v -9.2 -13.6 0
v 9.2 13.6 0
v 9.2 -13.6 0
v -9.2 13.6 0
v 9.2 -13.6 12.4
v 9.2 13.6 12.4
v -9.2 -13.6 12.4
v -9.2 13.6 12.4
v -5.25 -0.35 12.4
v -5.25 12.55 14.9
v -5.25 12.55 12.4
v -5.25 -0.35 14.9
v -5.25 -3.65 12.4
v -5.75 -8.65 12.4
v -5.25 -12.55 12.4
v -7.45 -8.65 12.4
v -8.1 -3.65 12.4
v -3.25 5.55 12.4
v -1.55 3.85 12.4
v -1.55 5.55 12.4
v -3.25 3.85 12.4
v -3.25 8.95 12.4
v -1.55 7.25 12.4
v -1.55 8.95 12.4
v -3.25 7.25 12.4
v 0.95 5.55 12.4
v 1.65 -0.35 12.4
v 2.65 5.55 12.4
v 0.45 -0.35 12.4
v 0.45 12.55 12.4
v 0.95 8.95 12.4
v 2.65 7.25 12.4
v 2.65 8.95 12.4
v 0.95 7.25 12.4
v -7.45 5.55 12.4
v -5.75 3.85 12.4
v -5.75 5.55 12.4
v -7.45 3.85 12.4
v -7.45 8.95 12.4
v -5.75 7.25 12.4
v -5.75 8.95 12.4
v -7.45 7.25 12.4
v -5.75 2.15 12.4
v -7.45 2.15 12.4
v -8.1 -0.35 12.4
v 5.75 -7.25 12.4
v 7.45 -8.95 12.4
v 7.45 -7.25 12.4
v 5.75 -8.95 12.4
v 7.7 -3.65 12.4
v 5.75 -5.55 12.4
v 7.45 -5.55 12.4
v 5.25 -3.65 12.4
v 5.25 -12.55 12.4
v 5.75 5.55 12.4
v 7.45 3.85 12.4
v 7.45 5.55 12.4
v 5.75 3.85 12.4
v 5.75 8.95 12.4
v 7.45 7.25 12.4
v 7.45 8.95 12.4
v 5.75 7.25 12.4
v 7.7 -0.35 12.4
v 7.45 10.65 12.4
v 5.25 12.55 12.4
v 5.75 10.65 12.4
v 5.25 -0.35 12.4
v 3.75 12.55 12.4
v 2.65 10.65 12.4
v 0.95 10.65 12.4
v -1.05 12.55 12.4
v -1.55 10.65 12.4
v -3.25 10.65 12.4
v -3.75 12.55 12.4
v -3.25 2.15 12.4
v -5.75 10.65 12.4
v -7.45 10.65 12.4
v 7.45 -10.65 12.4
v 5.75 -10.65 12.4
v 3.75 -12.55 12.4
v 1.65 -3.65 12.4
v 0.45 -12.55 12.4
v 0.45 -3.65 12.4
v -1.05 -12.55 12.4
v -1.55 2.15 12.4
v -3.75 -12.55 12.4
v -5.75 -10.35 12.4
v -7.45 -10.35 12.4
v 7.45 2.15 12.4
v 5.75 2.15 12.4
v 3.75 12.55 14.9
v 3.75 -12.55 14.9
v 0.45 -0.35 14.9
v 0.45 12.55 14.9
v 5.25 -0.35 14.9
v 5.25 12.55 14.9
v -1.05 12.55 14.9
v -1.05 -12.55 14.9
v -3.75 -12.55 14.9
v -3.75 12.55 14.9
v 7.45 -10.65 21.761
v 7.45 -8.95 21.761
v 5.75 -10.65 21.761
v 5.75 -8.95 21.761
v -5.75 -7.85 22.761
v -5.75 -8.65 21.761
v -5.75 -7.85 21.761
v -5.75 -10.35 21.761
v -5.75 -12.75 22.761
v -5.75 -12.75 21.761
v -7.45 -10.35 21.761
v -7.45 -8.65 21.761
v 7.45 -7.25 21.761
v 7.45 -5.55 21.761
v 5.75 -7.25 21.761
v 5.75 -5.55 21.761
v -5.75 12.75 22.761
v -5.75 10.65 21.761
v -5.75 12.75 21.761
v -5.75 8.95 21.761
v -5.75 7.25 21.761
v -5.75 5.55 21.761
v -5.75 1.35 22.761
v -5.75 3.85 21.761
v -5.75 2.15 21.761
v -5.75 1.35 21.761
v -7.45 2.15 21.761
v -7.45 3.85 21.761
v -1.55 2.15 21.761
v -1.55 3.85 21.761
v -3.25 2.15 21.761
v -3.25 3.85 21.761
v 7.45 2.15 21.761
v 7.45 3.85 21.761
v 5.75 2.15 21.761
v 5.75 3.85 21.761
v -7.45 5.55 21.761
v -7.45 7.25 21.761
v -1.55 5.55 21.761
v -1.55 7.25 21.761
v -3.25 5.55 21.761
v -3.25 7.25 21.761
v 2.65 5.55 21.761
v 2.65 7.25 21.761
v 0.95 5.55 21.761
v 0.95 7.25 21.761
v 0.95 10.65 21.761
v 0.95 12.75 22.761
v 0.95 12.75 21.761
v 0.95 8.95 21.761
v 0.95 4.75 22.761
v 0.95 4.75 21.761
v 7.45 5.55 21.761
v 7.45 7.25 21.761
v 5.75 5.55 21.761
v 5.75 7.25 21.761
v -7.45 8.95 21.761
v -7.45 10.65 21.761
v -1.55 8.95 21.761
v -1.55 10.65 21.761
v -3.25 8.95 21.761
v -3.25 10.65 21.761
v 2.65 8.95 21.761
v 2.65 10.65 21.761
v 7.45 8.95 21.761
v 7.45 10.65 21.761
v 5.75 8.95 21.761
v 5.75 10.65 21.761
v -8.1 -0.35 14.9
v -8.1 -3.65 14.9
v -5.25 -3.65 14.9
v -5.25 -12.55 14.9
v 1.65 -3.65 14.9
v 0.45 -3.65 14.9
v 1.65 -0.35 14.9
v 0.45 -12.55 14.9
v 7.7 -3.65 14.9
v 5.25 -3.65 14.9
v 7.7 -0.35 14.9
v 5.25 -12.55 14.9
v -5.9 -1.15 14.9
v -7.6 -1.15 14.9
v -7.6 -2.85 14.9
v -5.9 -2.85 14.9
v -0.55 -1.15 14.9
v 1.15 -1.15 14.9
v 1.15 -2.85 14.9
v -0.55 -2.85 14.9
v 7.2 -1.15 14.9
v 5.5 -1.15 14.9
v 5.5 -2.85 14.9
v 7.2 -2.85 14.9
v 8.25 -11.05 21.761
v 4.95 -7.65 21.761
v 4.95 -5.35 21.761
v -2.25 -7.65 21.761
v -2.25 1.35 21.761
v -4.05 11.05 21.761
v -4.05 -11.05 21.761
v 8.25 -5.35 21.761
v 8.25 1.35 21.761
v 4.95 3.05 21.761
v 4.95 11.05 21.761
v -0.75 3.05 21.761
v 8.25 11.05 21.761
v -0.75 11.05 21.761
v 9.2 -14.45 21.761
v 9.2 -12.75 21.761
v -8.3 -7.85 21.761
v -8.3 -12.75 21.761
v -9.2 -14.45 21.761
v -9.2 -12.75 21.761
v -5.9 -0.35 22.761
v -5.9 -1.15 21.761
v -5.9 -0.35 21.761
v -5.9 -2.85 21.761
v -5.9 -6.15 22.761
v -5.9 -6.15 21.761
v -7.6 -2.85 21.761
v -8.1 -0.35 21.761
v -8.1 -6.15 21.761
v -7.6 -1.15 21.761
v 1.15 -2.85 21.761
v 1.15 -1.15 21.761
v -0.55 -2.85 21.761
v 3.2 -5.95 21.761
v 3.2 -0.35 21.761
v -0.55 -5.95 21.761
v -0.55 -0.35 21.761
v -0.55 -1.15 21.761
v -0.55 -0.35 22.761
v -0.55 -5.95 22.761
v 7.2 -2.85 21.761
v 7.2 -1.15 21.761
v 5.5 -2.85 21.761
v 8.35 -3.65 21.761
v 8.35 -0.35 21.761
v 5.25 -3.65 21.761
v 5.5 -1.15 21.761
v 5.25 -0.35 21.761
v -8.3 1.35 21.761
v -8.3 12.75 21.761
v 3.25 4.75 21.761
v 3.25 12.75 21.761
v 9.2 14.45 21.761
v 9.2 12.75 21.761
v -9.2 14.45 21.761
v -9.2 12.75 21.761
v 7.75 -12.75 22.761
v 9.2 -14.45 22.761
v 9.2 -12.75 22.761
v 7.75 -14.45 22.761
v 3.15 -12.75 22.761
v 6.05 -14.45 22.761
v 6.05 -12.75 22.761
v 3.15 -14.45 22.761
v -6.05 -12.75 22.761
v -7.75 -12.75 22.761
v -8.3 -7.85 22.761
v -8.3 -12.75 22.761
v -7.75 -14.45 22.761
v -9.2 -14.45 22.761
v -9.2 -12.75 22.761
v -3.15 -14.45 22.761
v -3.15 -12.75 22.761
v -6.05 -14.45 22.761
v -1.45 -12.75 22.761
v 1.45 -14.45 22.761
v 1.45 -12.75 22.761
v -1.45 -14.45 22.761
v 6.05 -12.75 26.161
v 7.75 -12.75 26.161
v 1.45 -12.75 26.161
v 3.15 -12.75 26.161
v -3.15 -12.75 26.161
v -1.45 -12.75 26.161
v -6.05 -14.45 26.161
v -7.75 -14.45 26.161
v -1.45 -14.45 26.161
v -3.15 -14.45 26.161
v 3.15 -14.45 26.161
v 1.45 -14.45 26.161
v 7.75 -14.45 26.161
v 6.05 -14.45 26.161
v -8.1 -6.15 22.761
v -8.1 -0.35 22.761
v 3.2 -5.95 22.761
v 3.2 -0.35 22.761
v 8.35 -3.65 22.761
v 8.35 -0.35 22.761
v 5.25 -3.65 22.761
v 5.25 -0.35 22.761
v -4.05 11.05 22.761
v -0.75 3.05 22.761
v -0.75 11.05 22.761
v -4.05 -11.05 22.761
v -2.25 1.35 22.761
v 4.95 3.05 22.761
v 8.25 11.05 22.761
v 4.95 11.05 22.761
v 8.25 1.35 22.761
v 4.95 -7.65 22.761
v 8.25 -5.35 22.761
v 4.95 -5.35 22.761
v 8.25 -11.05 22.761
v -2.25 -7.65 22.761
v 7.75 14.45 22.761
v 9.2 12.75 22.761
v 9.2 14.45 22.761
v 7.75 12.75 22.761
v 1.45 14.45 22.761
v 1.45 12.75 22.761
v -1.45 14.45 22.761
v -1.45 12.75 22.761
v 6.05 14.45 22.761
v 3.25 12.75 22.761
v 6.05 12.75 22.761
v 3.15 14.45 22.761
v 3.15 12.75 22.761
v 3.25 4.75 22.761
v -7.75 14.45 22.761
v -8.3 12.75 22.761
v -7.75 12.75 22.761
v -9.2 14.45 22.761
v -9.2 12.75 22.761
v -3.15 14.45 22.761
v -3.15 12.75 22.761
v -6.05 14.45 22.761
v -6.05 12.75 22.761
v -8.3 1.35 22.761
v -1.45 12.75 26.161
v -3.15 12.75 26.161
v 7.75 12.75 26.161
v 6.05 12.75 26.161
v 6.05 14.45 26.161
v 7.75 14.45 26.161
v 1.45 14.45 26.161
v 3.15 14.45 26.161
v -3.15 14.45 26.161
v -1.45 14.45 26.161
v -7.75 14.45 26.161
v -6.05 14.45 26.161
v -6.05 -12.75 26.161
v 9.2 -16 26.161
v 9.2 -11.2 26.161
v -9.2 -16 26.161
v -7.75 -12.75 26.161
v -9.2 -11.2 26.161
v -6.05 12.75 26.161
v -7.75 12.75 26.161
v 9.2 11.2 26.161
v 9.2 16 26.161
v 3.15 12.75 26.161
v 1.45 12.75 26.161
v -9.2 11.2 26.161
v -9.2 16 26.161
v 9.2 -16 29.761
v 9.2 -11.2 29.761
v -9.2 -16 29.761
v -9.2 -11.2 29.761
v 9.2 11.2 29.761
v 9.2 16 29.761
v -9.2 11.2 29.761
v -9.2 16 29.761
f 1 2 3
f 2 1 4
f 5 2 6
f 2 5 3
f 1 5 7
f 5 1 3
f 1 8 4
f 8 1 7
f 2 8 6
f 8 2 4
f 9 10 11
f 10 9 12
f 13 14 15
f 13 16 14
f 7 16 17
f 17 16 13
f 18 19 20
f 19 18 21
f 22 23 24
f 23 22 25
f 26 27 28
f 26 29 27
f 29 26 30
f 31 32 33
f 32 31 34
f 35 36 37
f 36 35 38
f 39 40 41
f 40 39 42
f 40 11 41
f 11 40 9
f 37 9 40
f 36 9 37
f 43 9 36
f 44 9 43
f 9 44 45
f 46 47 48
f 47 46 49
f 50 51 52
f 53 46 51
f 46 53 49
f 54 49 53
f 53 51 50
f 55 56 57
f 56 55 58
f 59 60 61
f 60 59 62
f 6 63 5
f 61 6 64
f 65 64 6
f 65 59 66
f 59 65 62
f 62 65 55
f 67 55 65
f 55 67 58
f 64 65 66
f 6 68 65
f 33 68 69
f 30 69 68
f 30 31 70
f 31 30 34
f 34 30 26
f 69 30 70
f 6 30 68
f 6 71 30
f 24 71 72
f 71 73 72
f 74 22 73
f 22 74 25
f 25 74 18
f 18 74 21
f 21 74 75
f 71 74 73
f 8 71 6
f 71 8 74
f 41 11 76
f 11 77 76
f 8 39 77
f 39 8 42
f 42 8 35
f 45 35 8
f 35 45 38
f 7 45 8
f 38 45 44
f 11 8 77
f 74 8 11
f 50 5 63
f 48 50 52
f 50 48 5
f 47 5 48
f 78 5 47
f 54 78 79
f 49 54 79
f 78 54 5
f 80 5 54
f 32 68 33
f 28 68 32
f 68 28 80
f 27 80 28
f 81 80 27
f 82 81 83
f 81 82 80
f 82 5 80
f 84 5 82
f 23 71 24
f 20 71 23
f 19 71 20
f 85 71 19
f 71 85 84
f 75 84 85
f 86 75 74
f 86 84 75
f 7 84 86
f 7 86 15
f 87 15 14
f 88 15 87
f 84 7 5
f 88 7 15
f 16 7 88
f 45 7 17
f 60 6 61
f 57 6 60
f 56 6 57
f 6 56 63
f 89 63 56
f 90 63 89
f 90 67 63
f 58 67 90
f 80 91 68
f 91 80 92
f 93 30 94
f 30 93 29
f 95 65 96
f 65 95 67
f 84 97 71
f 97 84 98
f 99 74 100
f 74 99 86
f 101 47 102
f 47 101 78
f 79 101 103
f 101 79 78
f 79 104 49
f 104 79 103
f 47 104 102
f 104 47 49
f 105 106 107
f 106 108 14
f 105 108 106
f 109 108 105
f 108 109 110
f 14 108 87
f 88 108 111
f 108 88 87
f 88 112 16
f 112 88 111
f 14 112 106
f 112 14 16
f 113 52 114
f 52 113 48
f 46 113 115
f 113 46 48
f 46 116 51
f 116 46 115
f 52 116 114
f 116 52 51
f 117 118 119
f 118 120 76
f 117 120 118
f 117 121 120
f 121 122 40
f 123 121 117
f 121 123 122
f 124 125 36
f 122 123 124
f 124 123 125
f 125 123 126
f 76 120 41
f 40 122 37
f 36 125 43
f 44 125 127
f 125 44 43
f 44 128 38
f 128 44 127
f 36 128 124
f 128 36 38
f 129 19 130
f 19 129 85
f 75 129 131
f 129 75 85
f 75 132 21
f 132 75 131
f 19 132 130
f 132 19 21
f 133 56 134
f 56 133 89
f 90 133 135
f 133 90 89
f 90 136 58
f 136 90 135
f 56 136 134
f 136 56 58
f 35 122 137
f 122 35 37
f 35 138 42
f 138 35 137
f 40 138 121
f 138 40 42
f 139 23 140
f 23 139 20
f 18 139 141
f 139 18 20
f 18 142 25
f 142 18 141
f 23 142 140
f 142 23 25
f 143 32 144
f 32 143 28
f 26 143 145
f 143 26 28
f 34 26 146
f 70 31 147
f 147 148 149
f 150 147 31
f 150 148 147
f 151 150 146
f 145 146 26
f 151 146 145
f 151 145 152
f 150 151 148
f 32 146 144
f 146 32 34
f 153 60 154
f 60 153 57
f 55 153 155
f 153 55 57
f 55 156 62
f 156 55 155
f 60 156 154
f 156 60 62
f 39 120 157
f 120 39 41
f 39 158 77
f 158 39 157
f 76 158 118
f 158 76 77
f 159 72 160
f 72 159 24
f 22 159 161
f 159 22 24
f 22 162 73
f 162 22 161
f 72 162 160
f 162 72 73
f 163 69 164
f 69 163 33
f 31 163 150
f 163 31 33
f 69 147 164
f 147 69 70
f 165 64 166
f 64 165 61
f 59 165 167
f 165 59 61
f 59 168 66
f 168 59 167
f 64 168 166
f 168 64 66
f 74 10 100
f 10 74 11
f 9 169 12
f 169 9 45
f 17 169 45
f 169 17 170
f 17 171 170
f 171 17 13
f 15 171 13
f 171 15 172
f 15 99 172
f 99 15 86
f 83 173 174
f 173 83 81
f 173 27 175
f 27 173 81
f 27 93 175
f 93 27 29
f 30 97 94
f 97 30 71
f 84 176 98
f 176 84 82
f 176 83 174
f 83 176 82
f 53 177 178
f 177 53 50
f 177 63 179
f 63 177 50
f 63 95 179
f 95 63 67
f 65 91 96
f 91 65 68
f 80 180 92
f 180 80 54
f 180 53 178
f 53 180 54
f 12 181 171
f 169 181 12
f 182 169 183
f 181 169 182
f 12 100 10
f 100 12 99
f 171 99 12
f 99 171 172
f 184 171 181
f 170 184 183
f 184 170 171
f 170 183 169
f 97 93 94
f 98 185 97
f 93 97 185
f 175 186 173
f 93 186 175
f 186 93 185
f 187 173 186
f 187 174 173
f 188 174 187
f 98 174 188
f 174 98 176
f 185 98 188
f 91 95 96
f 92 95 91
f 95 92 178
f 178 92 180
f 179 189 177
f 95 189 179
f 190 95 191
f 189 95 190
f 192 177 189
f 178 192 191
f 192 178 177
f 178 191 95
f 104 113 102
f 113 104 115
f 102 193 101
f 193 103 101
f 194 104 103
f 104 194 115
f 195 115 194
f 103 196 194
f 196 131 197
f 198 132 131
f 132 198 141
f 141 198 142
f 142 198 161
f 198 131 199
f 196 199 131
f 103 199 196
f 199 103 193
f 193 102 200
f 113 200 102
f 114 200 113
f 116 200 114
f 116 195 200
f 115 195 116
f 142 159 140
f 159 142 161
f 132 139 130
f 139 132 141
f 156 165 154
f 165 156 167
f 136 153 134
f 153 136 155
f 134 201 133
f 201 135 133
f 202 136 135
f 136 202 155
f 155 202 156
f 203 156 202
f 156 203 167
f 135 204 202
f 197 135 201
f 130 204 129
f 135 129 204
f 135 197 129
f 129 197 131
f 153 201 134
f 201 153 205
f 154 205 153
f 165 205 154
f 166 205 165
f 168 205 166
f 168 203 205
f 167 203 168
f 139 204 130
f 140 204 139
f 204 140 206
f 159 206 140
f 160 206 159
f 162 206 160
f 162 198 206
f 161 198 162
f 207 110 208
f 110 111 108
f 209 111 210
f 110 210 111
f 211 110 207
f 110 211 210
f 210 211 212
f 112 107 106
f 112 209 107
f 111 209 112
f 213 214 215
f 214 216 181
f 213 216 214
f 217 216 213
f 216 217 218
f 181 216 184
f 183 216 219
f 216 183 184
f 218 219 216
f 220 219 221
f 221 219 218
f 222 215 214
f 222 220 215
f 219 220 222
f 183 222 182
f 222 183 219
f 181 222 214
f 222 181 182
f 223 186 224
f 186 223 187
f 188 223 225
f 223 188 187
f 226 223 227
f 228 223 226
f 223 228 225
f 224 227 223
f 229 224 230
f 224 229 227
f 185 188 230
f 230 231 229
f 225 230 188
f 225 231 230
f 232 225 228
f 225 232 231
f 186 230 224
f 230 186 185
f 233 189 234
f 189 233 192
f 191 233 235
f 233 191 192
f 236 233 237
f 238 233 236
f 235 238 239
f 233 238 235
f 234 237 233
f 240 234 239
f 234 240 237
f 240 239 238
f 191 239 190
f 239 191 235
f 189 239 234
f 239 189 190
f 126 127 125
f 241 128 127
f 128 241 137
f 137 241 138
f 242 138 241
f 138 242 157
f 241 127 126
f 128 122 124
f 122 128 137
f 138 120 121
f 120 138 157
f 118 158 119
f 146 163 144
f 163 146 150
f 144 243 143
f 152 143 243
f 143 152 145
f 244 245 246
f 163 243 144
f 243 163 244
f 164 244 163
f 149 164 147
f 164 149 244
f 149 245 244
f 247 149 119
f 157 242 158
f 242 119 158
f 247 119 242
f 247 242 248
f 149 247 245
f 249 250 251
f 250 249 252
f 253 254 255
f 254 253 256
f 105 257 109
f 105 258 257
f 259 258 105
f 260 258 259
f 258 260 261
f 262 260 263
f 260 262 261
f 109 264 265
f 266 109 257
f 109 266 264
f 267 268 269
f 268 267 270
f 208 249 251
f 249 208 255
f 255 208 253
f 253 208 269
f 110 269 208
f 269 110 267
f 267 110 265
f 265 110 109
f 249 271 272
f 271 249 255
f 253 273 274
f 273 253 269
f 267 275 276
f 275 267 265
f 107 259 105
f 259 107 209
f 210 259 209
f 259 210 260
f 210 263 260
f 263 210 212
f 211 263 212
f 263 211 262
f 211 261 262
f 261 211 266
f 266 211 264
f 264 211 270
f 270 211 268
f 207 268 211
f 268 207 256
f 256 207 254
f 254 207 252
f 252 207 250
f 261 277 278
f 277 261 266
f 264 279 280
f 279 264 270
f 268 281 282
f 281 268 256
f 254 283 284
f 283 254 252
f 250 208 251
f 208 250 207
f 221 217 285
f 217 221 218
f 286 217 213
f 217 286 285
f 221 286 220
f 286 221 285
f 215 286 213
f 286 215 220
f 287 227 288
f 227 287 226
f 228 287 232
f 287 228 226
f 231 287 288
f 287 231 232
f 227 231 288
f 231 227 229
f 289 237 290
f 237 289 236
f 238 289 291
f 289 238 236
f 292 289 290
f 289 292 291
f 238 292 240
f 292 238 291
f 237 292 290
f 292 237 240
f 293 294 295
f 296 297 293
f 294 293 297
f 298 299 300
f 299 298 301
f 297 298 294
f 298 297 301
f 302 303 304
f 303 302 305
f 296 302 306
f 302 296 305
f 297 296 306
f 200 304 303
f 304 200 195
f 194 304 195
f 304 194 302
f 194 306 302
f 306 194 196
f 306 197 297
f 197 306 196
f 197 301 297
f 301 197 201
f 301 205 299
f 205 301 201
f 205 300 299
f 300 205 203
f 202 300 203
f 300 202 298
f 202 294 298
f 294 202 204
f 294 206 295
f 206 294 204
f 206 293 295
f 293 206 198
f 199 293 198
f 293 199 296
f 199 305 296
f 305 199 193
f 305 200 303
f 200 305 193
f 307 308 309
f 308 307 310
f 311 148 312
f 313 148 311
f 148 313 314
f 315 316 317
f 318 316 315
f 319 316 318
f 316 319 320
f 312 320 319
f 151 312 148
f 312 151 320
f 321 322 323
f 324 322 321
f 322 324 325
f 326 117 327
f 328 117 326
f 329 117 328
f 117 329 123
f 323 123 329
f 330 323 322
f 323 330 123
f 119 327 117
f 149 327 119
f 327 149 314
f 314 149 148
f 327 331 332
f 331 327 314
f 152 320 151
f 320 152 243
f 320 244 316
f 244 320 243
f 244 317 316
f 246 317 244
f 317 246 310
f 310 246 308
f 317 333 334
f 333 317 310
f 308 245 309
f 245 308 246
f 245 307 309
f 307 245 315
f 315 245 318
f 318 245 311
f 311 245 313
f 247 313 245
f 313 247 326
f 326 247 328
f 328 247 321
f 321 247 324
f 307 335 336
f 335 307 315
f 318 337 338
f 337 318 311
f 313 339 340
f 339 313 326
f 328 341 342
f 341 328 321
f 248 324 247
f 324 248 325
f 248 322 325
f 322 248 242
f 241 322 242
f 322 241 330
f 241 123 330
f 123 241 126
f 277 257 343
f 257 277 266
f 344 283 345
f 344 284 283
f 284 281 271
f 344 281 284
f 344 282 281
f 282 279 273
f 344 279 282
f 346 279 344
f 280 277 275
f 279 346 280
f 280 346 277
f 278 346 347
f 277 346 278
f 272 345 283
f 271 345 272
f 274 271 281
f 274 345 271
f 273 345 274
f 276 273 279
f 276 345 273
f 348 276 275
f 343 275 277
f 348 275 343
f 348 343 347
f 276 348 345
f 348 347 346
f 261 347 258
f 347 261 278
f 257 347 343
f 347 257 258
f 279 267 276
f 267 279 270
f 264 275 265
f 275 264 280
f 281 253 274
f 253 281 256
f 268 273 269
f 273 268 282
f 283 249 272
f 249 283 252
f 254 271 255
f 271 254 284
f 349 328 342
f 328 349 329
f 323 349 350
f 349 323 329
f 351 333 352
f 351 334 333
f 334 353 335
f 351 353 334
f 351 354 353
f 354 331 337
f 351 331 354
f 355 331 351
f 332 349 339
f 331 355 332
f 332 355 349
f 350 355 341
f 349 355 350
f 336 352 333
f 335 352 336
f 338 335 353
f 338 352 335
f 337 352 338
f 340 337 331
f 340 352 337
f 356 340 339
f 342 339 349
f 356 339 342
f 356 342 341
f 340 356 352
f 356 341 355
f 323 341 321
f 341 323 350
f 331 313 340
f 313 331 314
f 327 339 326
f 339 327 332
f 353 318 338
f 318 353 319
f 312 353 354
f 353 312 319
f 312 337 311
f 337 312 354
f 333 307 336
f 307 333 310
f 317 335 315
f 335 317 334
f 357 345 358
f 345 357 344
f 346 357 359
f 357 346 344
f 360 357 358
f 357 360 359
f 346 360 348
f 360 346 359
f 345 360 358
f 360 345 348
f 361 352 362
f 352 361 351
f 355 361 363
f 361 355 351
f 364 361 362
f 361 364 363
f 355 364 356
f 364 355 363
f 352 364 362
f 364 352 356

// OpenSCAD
// Generated by SolidPython 0.4.2 on 2020-09-29 23:21:24
//!OpenSCAD

scale(v = 0.0100000000) {
	translate(v = [-920, -1360, 0]) {
		union() {
			color(c = [0.4000000000, 0.4000000000, 0.4000000000]) {
				translate(v = [0, 0, 0]) {
					linear_extrude(height = 1000.0000000000) {
						polygon(paths = [[0, 1, 2, 3]], points = [[0, 0], [0, 2720], [1840, 2720], [1840, 0]]);
					}
				}
			}
			color(c = [0.2000000000, 0.6000000000, 0.2000000000]) {
				translate(v = [0, 0, 1000.0000000000]) {
					linear_extrude(height = 120.0000000000) {
						polygon(paths = [[0, 1, 2, 3]], points = [[0, 1305], [0, 2720], [1840, 2720], [1840, 1305]]);
					}
				}
			}
			color(c = [0.4000000000, 0.4000000000, 0.4000000000]) {
				translate(v = [0, 0, 1000.0000000000]) {
					linear_extrude(height = 120.0000000000) {
						polygon(paths = [[0, 1, 2, 3]], points = [[0, 0], [0, 1305], [1840, 1305], [1840, 0]]);
					}
				}
			}
			color(c = [0.9000000000, 0.6000000000, 0.6000000000]) {
				translate(v = [0, 0, 1120.0000000000]) {
					linear_extrude(height = 120.0000000000) {
						polygon(paths = [[0, 1, 2, 3]], points = [[135, 1485], [135, 2485], [395, 2485], [395, 1485]]);
					}
				}
			}
			color(c = [0.9000000000, 0.6000000000, 0.6000000000]) {
				translate(v = [0, 0, 1120.0000000000]) {
					linear_extrude(height = 120.0000000000) {
						polygon(paths = [[0, 1, 2, 3]], points = [[545, 1485], [545, 2485], [815, 2485], [815, 1485]]);
					}
				}
			}
			color(c = [0.9000000000, 0.6000000000, 0.6000000000]) {
				translate(v = [0, 0, 1120.0000000000]) {
					linear_extrude(height = 120.0000000000) {
						polygon(paths = [[0, 1, 2, 3]], points = [[965, 1485], [965, 2485], [1295, 2485], [1295, 1485]]);
					}
				}
			}
			color(c = [0.9000000000, 0.6000000000, 0.6000000000]) {
				translate(v = [0, 0, 1120.0000000000]) {
					linear_extrude(height = 120.0000000000) {
						polygon(paths = [[0, 1, 2, 3]], points = [[1445, 1485], [1445, 2485], [1705, 2485], [1705, 1485]]);
					}
				}
			}
			color(c = [0.9000000000, 0.6000000000, 0.9000000000]) {
				translate(v = [0, 0, 1120.0000000000]) {
					linear_extrude(height = 120.0000000000) {
						polygon(paths = [[0, 1, 2, 3]], points = [[135, 235], [135, 885], [395, 885], [395, 235]]);
					}
				}
			}
			color(c = [0.9000000000, 0.6000000000, 0.9000000000]) {
				translate(v = [0, 0, 1120.0000000000]) {
					linear_extrude(height = 120.0000000000) {
						polygon(paths = [[0, 1, 2, 3]], points = [[545, 235], [545, 885], [815, 885], [815, 235]]);
					}
				}
			}
			color(c = [0.9000000000, 0.6000000000, 0.9000000000]) {
				translate(v = [0, 0, 1120.0000000000]) {
					linear_extrude(height = 120.0000000000) {
						polygon(paths = [[0, 1, 2, 3]], points = [[965, 235], [965, 885], [1295, 885], [1295, 235]]);
					}
				}
			}
			color(c = [0.9000000000, 0.6000000000, 0.9000000000]) {
				translate(v = [0, 0, 1120.0000000000]) {
					linear_extrude(height = 120.0000000000) {
						polygon(paths = [[0, 1, 2, 3]], points = [[1445, 235], [1445, 885], [1705, 885], [1705, 235]]);
					}
				}
			}
			color(c = [0.2000000000, 0.6000000000, 0.2000000000]) {
				translate(v = [0, 0, 1120.0000000000]) {
					linear_extrude(height = 120.0000000000) {
						difference() {
							polygon(paths = [[0, 1, 2, 3]], points = [[0, 1305], [0, 2720], [1840, 2720], [1840, 1305]]);
							polygon(paths = [[0, 1, 2, 3]], points = [[135, 1485], [395, 1485], [395, 2485], [135, 2485]]);
							polygon(paths = [[0, 1, 2, 3]], points = [[545, 1485], [815, 1485], [815, 2485], [545, 2485]]);
							polygon(paths = [[0, 1, 2, 3]], points = [[965, 1485], [1295, 1485], [1295, 2485], [965, 2485]]);
							polygon(paths = [[0, 1, 2, 3]], points = [[1445, 1485], [1705, 1485], [1705, 2485], [1445, 2485]]);
						}
					}
				}
			}
			color(c = [0.4000000000, 0.4000000000, 0.4000000000]) {
				translate(v = [0, 0, 1120.0000000000]) {
					linear_extrude(height = 120.0000000000) {
						difference() {
							polygon(paths = [[0, 1, 2, 3]], points = [[0, 0], [0, 1305], [1840, 1305], [1840, 0]]);
							polygon(paths = [[0, 1, 2, 3]], points = [[135, 235], [395, 235], [395, 885], [135, 885]]);
							polygon(paths = [[0, 1, 2, 3]], points = [[545, 235], [815, 235], [815, 885], [545, 885]]);
							polygon(paths = [[0, 1, 2, 3]], points = [[965, 235], [1295, 235], [1295, 885], [965, 885]]);
							polygon(paths = [[0, 1, 2, 3]], points = [[1445, 235], [1705, 235], [1705, 885], [1445, 885]]);
						}
					}
				}
			}
			color(c = [0.1000000000, 0.1000000000, 0.1000000000]) {
				translate(v = [0, 0, 1240.0000000000]) {
					linear_extrude(height = 70.0000000000) {
						polygon(paths = [[0, 1, 2, 3]], points = [[1495, 295], [1495, 465], [1665, 465], [1665, 295]]);
					}
				}
			}
			color(c = [0.1000000000, 0.1000000000, 0.1000000000]) {
				translate(v = [0, 0, 1240.0000000000]) {
					linear_extrude(height = 70.0000000000) {
						polygon(paths = [[0, 1, 2, 3]], points = [[175, 325], [175, 495], [345, 495], [345, 325]]);
					}
				}
			}
			color(c = [0.1000000000, 0.1000000000, 0.1000000000]) {
				translate(v = [0, 0, 1240.0000000000]) {
					linear_extrude(height = 70.0000000000) {
						polygon(paths = [[0, 1, 2, 3]], points = [[1495, 635], [1495, 805], [1665, 805], [1665, 635]]);
					}
				}
			}
			color(c = [0.1000000000, 0.1000000000, 0.1000000000]) {
				translate(v = [0, 0, 1240.0000000000]) {
					linear_extrude(height = 70.0000000000) {
						polygon(paths = [[0, 1, 2, 3]], points = [[175, 1575], [175, 1745], [345, 1745], [345, 1575]]);
					}
				}
			}
			color(c = [0.1000000000, 0.1000000000, 0.1000000000]) {
				translate(v = [0, 0, 1240.0000000000]) {
					linear_extrude(height = 70.0000000000) {
						polygon(paths = [[0, 1, 2, 3]], points = [[595, 1575], [595, 1745], [765, 1745], [765, 1575]]);
					}
				}
			}
			color(c = [0.1000000000, 0.1000000000, 0.1000000000]) {
				translate(v = [0, 0, 1240.0000000000]) {
					linear_extrude(height = 70.0000000000) {
						polygon(paths = [[0, 1, 2, 3]], points = [[1495, 1575], [1495, 1745], [1665, 1745], [1665, 1575]]);
					}
				}
			}
			color(c = [0.1000000000, 0.1000000000, 0.1000000000]) {
				translate(v = [0, 0, 1240.0000000000]) {
					linear_extrude(height = 70.0000000000) {
						polygon(paths = [[0, 1, 2, 3]], points = [[175, 1915], [175, 2085], [345, 2085], [345, 1915]]);
					}
				}
			}
			color(c = [0.1000000000, 0.1000000000, 0.1000000000]) {
				translate(v = [0, 0, 1240.0000000000]) {
					linear_extrude(height = 70.0000000000) {
						polygon(paths = [[0, 1, 2, 3]], points = [[595, 1915], [595, 2085], [765, 2085], [765, 1915]]);
					}
				}
			}
			color(c = [0.1000000000, 0.1000000000, 0.1000000000]) {
				translate(v = [0, 0, 1240.0000000000]) {
					linear_extrude(height = 70.0000000000) {
						polygon(paths = [[0, 1, 2, 3]], points = [[1015, 1915], [1015, 2085], [1185, 2085], [1185, 1915]]);
					}
				}
			}
			color(c = [0.1000000000, 0.1000000000, 0.1000000000]) {
				translate(v = [0, 0, 1240.0000000000]) {
					linear_extrude(height = 70.0000000000) {
						polygon(paths = [[0, 1, 2, 3]], points = [[1495, 1915], [1495, 2085], [1665, 2085], [1665, 1915]]);
					}
				}
			}
			color(c = [0.1000000000, 0.1000000000, 0.1000000000]) {
				translate(v = [0, 0, 1240.0000000000]) {
					linear_extrude(height = 70.0000000000) {
						polygon(paths = [[0, 1, 2, 3]], points = [[175, 2255], [175, 2425], [345, 2425], [345, 2255]]);
					}
				}
			}
			color(c = [0.1000000000, 0.1000000000, 0.1000000000]) {
				translate(v = [0, 0, 1240.0000000000]) {
					linear_extrude(height = 70.0000000000) {
						polygon(paths = [[0, 1, 2, 3]], points = [[595, 2255], [595, 2425], [765, 2425], [765, 2255]]);
					}
				}
			}
			color(c = [0.1000000000, 0.1000000000, 0.1000000000]) {
				translate(v = [0, 0, 1240.0000000000]) {
					linear_extrude(height = 70.0000000000) {
						polygon(paths = [[0, 1, 2, 3]], points = [[1015, 2255], [1015, 2425], [1185, 2425], [1185, 2255]]);
					}
				}
			}
			color(c = [0.1000000000, 0.1000000000, 0.1000000000]) {
				translate(v = [0, 0, 1240.0000000000]) {
					linear_extrude(height = 70.0000000000) {
						polygon(paths = [[0, 1, 2, 3]], points = [[1495, 2255], [1495, 2425], [1665, 2425], [1665, 2255]]);
					}
				}
			}
			color(c = [1.0000000000, 1.0000000000, 1.0000000000]) {
				translate(v = [0, 0, 1240.0000000000]) {
					linear_extrude(height = 70.0000000000) {
						polygon(paths = [[0, 1, 2, 3, 4, 5, 6, 7]], points = [[395, 105], [395, 995], [110, 995], [110, 1325], [395, 1325], [395, 2615], [545, 2615], [545, 105]]);
					}
				}
			}
			color(c = [1.0000000000, 1.0000000000, 1.0000000000]) {
				translate(v = [0, 0, 1240.0000000000]) {
					linear_extrude(height = 70.0000000000) {
						polygon(paths = [[0, 1, 2, 3, 4, 5, 6, 7]], points = [[815, 105], [815, 2615], [965, 2615], [965, 1325], [1085, 1325], [1085, 995], [965, 995], [965, 105]]);
					}
				}
			}
			color(c = [1.0000000000, 1.0000000000, 1.0000000000]) {
				translate(v = [0, 0, 1240.0000000000]) {
					linear_extrude(height = 70.0000000000) {
						polygon(paths = [[0, 1, 2, 3, 4, 5, 6, 7]], points = [[1295, 105], [1295, 2615], [1445, 2615], [1445, 1325], [1690, 1325], [1690, 995], [1445, 995], [1445, 105]]);
					}
				}
			}
			color(c = [0.1000000000, 0.1000000000, 0.1000000000]) {
				translate(v = [0, 0, 1310.0000000000]) {
					linear_extrude(height = 180.0000000000) {
						polygon(paths = [[0, 1, 2, 3]], points = [[1495, 295], [1495, 465], [1665, 465], [1665, 295]]);
					}
				}
			}
			color(c = [0.1000000000, 0.1000000000, 0.1000000000]) {
				translate(v = [0, 0, 1310.0000000000]) {
					linear_extrude(height = 180.0000000000) {
						polygon(paths = [[0, 1, 2, 3]], points = [[175, 325], [175, 495], [345, 495], [345, 325]]);
					}
				}
			}
			color(c = [0.1000000000, 0.1000000000, 0.1000000000]) {
				translate(v = [0, 0, 1310.0000000000]) {
					linear_extrude(height = 180.0000000000) {
						polygon(paths = [[0, 1, 2, 3]], points = [[1495, 635], [1495, 805], [1665, 805], [1665, 635]]);
					}
				}
			}
			color(c = [0.1000000000, 0.1000000000, 0.1000000000]) {
				translate(v = [0, 0, 1310.0000000000]) {
					linear_extrude(height = 180.0000000000) {
						polygon(paths = [[0, 1, 2, 3]], points = [[175, 1575], [175, 1745], [345, 1745], [345, 1575]]);
					}
				}
			}
			color(c = [0.1000000000, 0.1000000000, 0.1000000000]) {
				translate(v = [0, 0, 1310.0000000000]) {
					linear_extrude(height = 180.0000000000) {
						polygon(paths = [[0, 1, 2, 3]], points = [[595, 1575], [595, 1745], [765, 1745], [765, 1575]]);
					}
				}
			}
			color(c = [0.1000000000, 0.1000000000, 0.1000000000]) {
				translate(v = [0, 0, 1310.0000000000]) {
					linear_extrude(height = 180.0000000000) {
						polygon(paths = [[0, 1, 2, 3]], points = [[1495, 1575], [1495, 1745], [1665, 1745], [1665, 1575]]);
					}
				}
			}
			color(c = [0.1000000000, 0.1000000000, 0.1000000000]) {
				translate(v = [0, 0, 1310.0000000000]) {
					linear_extrude(height = 180.0000000000) {
						polygon(paths = [[0, 1, 2, 3]], points = [[175, 1915], [175, 2085], [345, 2085], [345, 1915]]);
					}
				}
			}
			color(c = [0.1000000000, 0.1000000000, 0.1000000000]) {
				translate(v = [0, 0, 1310.0000000000]) {
					linear_extrude(height = 180.0000000000) {
						polygon(paths = [[0, 1, 2, 3]], points = [[595, 1915], [595, 2085], [765, 2085], [765, 1915]]);
					}
				}
			}
			color(c = [0.1000000000, 0.1000000000, 0.1000000000]) {
				translate(v = [0, 0, 1310.0000000000]) {
					linear_extrude(height = 180.0000000000) {
						polygon(paths = [[0, 1, 2, 3]], points = [[1015, 1915], [1015, 2085], [1185, 2085], [1185, 1915]]);
					}
				}
			}
			color(c = [0.1000000000, 0.1000000000, 0.1000000000]) {
				translate(v = [0, 0, 1310.0000000000]) {
					linear_extrude(height = 180.0000000000) {
						polygon(paths = [[0, 1, 2, 3]], points = [[1495, 1915], [1495, 2085], [1665, 2085], [1665, 1915]]);
					}
				}
			}
			color(c = [0.1000000000, 0.1000000000, 0.1000000000]) {
				translate(v = [0, 0, 1310.0000000000]) {
					linear_extrude(height = 180.0000000000) {
						polygon(paths = [[0, 1, 2, 3]], points = [[175, 2255], [175, 2425], [345, 2425], [345, 2255]]);
					}
				}
			}
			color(c = [0.1000000000, 0.1000000000, 0.1000000000]) {
				translate(v = [0, 0, 1310.0000000000]) {
					linear_extrude(height = 180.0000000000) {
						polygon(paths = [[0, 1, 2, 3]], points = [[595, 2255], [595, 2425], [765, 2425], [765, 2255]]);
					}
				}
			}
			color(c = [0.1000000000, 0.1000000000, 0.1000000000]) {
				translate(v = [0, 0, 1310.0000000000]) {
					linear_extrude(height = 180.0000000000) {
						polygon(paths = [[0, 1, 2, 3]], points = [[1015, 2255], [1015, 2425], [1185, 2425], [1185, 2255]]);
					}
				}
			}
			color(c = [0.1000000000, 0.1000000000, 0.1000000000]) {
				translate(v = [0, 0, 1310.0000000000]) {
					linear_extrude(height = 180.0000000000) {
						polygon(paths = [[0, 1, 2, 3]], points = [[1495, 2255], [1495, 2425], [1665, 2425], [1665, 2255]]);
					}
				}
			}
			color(c = [0.7000000000, 0, 0]) {
				translate(v = [0, 0, 1310.0000000000]) {
					linear_extrude(height = 180.0000000000) {
						polygon(paths = [[0, 1, 2, 3, 4, 5, 6, 7]], points = [[395, 105], [395, 995], [110, 995], [110, 1325], [395, 1325], [395, 2615], [545, 2615], [545, 105]]);
					}
				}
			}
			color(c = [0.7000000000, 0, 0]) {
				translate(v = [0, 0, 1310.0000000000]) {
					linear_extrude(height = 180.0000000000) {
						polygon(paths = [[0, 1, 2, 3, 4, 5, 6, 7]], points = [[815, 105], [815, 2615], [965, 2615], [965, 1325], [1085, 1325], [1085, 995], [965, 995], [965, 105]]);
					}
				}
			}
			color(c = [0.7000000000, 0, 0]) {
				translate(v = [0, 0, 1310.0000000000]) {
					linear_extrude(height = 180.0000000000) {
						polygon(paths = [[0, 1, 2, 3, 4, 5, 6, 7]], points = [[1295, 105], [1295, 2615], [1445, 2615], [1445, 1325], [1690, 1325], [1690, 995], [1445, 995], [1445, 105]]);
					}
				}
			}
			color(c = [0.1000000000, 0.1000000000, 0.1000000000]) {
				translate(v = [0, 0, 1490.0000000000]) {
					linear_extrude(height = 686.1000000000) {
						polygon(paths = [[0, 1, 2, 3]], points = [[1495, 295], [1495, 465], [1665, 465], [1665, 295]]);
					}
				}
			}
			color(c = [0.1000000000, 0.1000000000, 0.1000000000]) {
				translate(v = [0, 0, 1490.0000000000]) {
					linear_extrude(height = 686.1000000000) {
						polygon(paths = [[0, 1, 2, 3]], points = [[175, 325], [175, 495], [345, 495], [345, 325]]);
					}
				}
			}
			color(c = [0.1000000000, 0.1000000000, 0.1000000000]) {
				translate(v = [0, 0, 1490.0000000000]) {
					linear_extrude(height = 686.1000000000) {
						polygon(paths = [[0, 1, 2, 3]], points = [[1495, 635], [1495, 805], [1665, 805], [1665, 635]]);
					}
				}
			}
			color(c = [0.1000000000, 0.1000000000, 0.1000000000]) {
				translate(v = [0, 0, 1490.0000000000]) {
					linear_extrude(height = 686.1000000000) {
						polygon(paths = [[0, 1, 2, 3]], points = [[160, 1075], [160, 1245], [330, 1245], [330, 1075]]);
					}
				}
			}
			color(c = [0.1000000000, 0.1000000000, 0.1000000000]) {
				translate(v = [0, 0, 1490.0000000000]) {
					linear_extrude(height = 686.1000000000) {
						polygon(paths = [[0, 1, 2, 3]], points = [[865, 1075], [865, 1245], [1035, 1245], [1035, 1075]]);
					}
				}
			}
			color(c = [0.1000000000, 0.1000000000, 0.1000000000]) {
				translate(v = [0, 0, 1490.0000000000]) {
					linear_extrude(height = 686.1000000000) {
						polygon(paths = [[0, 1, 2, 3]], points = [[1470, 1075], [1470, 1245], [1640, 1245], [1640, 1075]]);
					}
				}
			}
			color(c = [0.1000000000, 0.1000000000, 0.1000000000]) {
				translate(v = [0, 0, 1490.0000000000]) {
					linear_extrude(height = 686.1000000000) {
						polygon(paths = [[0, 1, 2, 3]], points = [[175, 1575], [175, 1745], [345, 1745], [345, 1575]]);
					}
				}
			}
			color(c = [0.1000000000, 0.1000000000, 0.1000000000]) {
				translate(v = [0, 0, 1490.0000000000]) {
					linear_extrude(height = 686.1000000000) {
						polygon(paths = [[0, 1, 2, 3]], points = [[595, 1575], [595, 1745], [765, 1745], [765, 1575]]);
					}
				}
			}
			color(c = [0.1000000000, 0.1000000000, 0.1000000000]) {
				translate(v = [0, 0, 1490.0000000000]) {
					linear_extrude(height = 686.1000000000) {
						polygon(paths = [[0, 1, 2, 3]], points = [[1495, 1575], [1495, 1745], [1665, 1745], [1665, 1575]]);
					}
				}
			}
			color(c = [0.1000000000, 0.1000000000, 0.1000000000]) {
				translate(v = [0, 0, 1490.0000000000]) {
					linear_extrude(height = 686.1000000000) {
						polygon(paths = [[0, 1, 2, 3]], points = [[175, 1915], [175, 2085], [345, 2085], [345, 1915]]);
					}
				}
			}
			color(c = [0.1000000000, 0.1000000000, 0.1000000000]) {
				translate(v = [0, 0, 1490.0000000000]) {
					linear_extrude(height = 686.1000000000) {
						polygon(paths = [[0, 1, 2, 3]], points = [[595, 1915], [595, 2085], [765, 2085], [765, 1915]]);
					}
				}
			}
			color(c = [0.1000000000, 0.1000000000, 0.1000000000]) {
				translate(v = [0, 0, 1490.0000000000]) {
					linear_extrude(height = 686.1000000000) {
						polygon(paths = [[0, 1, 2, 3]], points = [[1015, 1915], [1015, 2085], [1185, 2085], [1185, 1915]]);
					}
				}
			}
			color(c = [0.1000000000, 0.1000000000, 0.1000000000]) {
				translate(v = [0, 0, 1490.0000000000]) {
					linear_extrude(height = 686.1000000000) {
						polygon(paths = [[0, 1, 2, 3]], points = [[1495, 1915], [1495, 2085], [1665, 2085], [1665, 1915]]);
					}
				}
			}
			color(c = [0.1000000000, 0.1000000000, 0.1000000000]) {
				translate(v = [0, 0, 1490.0000000000]) {
					linear_extrude(height = 686.1000000000) {
						polygon(paths = [[0, 1, 2, 3]], points = [[175, 2255], [175, 2425], [345, 2425], [345, 2255]]);
					}
				}
			}
			color(c = [0.1000000000, 0.1000000000, 0.1000000000]) {
				translate(v = [0, 0, 1490.0000000000]) {
					linear_extrude(height = 686.1000000000) {
						polygon(paths = [[0, 1, 2, 3]], points = [[595, 2255], [595, 2425], [765, 2425], [765, 2255]]);
					}
				}
			}
			color(c = [0.1000000000, 0.1000000000, 0.1000000000]) {
				translate(v = [0, 0, 1490.0000000000]) {
					linear_extrude(height = 686.1000000000) {
						polygon(paths = [[0, 1, 2, 3]], points = [[1015, 2255], [1015, 2425], [1185, 2425], [1185, 2255]]);
					}
				}
			}
			color(c = [0.1000000000, 0.1000000000, 0.1000000000]) {
				translate(v = [0, 0, 1490.0000000000]) {
					linear_extrude(height = 686.1000000000) {
						polygon(paths = [[0, 1, 2, 3]], points = [[1495, 2255], [1495, 2425], [1665, 2425], [1665, 2255]]);
					}
				}
			}
			color(c = [0.9000000000, 0.6000000000, 0.6000000000]) {
				translate(v = [0, 0, 2176.1000000000]) {
					linear_extrude(height = 100.0000000000) {
						polygon(paths = [[0, 1, 2, 3, 4, 5, 6, 7]], points = [[0, -85], [0, 85], [90, 85], [90, 575], [345, 575], [345, 85], [1840, 85], [1840, -85]]);
					}
				}
			}
			color(c = [0.9000000000, 0.6000000000, 0.6000000000]) {
				translate(v = [0, 0, 2176.1000000000]) {
					linear_extrude(height = 100.0000000000) {
						polygon(paths = [[0, 1, 2, 3]], points = [[110, 745], [110, 1325], [330, 1325], [330, 745]]);
					}
				}
			}
			color(c = [0.9000000000, 0.6000000000, 0.6000000000]) {
				translate(v = [0, 0, 2176.1000000000]) {
					linear_extrude(height = 100.0000000000) {
						polygon(paths = [[0, 1, 2, 3]], points = [[865, 765], [865, 1325], [1240, 1325], [1240, 765]]);
					}
				}
			}
			color(c = [0.9000000000, 0.6000000000, 0.6000000000]) {
				translate(v = [0, 0, 2176.1000000000]) {
					linear_extrude(height = 100.0000000000) {
						polygon(paths = [[0, 1, 2, 3]], points = [[1445, 995], [1445, 1325], [1755, 1325], [1755, 995]]);
					}
				}
			}
			color(c = [0.9000000000, 0.6000000000, 0.6000000000]) {
				translate(v = [0, 0, 2176.1000000000]) {
					linear_extrude(height = 100.0000000000) {
						polygon(paths = [[0, 1, 2, 3, 4, 5, 6, 7, 8, 9, 10, 11, 12, 13]], points = [[515, 255], [515, 2465], [845, 2465], [845, 1665], [1415, 1665], [1415, 2465], [1745, 2465], [1745, 1495], [695, 1495], [695, 595], [1415, 595], [1415, 825], [1745, 825], [1745, 255]]);
					}
				}
			}
			color(c = [0.9000000000, 0.6000000000, 0.6000000000]) {
				translate(v = [0, 0, 2176.1000000000]) {
					linear_extrude(height = 100.0000000000) {
						polygon(paths = [[0, 1, 2, 3, 4, 5, 6, 7, 8, 9, 10, 11]], points = [[90, 1495], [90, 2635], [0, 2635], [0, 2805], [1840, 2805], [1840, 2635], [1245, 2635], [1245, 1835], [1015, 1835], [1015, 2635], [345, 2635], [345, 1495]]);
					}
				}
			}
			color(c = [0.5000000000, 0.5000000000, 0.5000000000]) {
				translate(v = [0, 0, 2276.1000000000]) {
					linear_extrude(height = 340.0000000000) {
						polygon(paths = [[0, 1, 2, 3]], points = [[145, -85], [145, 85], [315, 85], [315, -85]]);
					}
				}
			}
			color(c = [0.5000000000, 0.5000000000, 0.5000000000]) {
				translate(v = [0, 0, 2276.1000000000]) {
					linear_extrude(height = 340.0000000000) {
						polygon(paths = [[0, 1, 2, 3]], points = [[605, -85], [605, 85], [775, 85], [775, -85]]);
					}
				}
			}
			color(c = [0.5000000000, 0.5000000000, 0.5000000000]) {
				translate(v = [0, 0, 2276.1000000000]) {
					linear_extrude(height = 340.0000000000) {
						polygon(paths = [[0, 1, 2, 3]], points = [[1065, -85], [1065, 85], [1235, 85], [1235, -85]]);
					}
				}
			}
			color(c = [0.5000000000, 0.5000000000, 0.5000000000]) {
				translate(v = [0, 0, 2276.1000000000]) {
					linear_extrude(height = 340.0000000000) {
						polygon(paths = [[0, 1, 2, 3]], points = [[1525, -85], [1525, 85], [1695, 85], [1695, -85]]);
					}
				}
			}
			color(c = [0.5000000000, 0.5000000000, 0.5000000000]) {
				translate(v = [0, 0, 2276.1000000000]) {
					linear_extrude(height = 340.0000000000) {
						polygon(paths = [[0, 1, 2, 3]], points = [[145, 2635], [145, 2805], [315, 2805], [315, 2635]]);
					}
				}
			}
			color(c = [0.5000000000, 0.5000000000, 0.5000000000]) {
				translate(v = [0, 0, 2276.1000000000]) {
					linear_extrude(height = 340.0000000000) {
						polygon(paths = [[0, 1, 2, 3]], points = [[605, 2635], [605, 2805], [775, 2805], [775, 2635]]);
					}
				}
			}
			color(c = [0.5000000000, 0.5000000000, 0.5000000000]) {
				translate(v = [0, 0, 2276.1000000000]) {
					linear_extrude(height = 340.0000000000) {
						polygon(paths = [[0, 1, 2, 3]], points = [[1065, 2635], [1065, 2805], [1235, 2805], [1235, 2635]]);
					}
				}
			}
			color(c = [0.5000000000, 0.5000000000, 0.5000000000]) {
				translate(v = [0, 0, 2276.1000000000]) {
					linear_extrude(height = 340.0000000000) {
						polygon(paths = [[0, 1, 2, 3]], points = [[1525, 2635], [1525, 2805], [1695, 2805], [1695, 2635]]);
					}
				}
			}
			color(c = [0.3000000000, 0.3000000000, 1]) {
				translate(v = [0, 0, 2616.1000000000]) {
					linear_extrude(height = 360.0000000000) {
						polygon(paths = [[0, 1, 2, 3]], points = [[0, -240], [0, 240], [1840, 240], [1840, -240]]);
					}
				}
			}
			color(c = [0.3000000000, 0.3000000000, 1]) {
				translate(v = [0, 0, 2616.1000000000]) {
					linear_extrude(height = 360.0000000000) {
						polygon(paths = [[0, 1, 2, 3]], points = [[0, 2480], [0, 2960], [1840, 2960], [1840, 2480]]);
					}
				}
			}
		}
	}
}
